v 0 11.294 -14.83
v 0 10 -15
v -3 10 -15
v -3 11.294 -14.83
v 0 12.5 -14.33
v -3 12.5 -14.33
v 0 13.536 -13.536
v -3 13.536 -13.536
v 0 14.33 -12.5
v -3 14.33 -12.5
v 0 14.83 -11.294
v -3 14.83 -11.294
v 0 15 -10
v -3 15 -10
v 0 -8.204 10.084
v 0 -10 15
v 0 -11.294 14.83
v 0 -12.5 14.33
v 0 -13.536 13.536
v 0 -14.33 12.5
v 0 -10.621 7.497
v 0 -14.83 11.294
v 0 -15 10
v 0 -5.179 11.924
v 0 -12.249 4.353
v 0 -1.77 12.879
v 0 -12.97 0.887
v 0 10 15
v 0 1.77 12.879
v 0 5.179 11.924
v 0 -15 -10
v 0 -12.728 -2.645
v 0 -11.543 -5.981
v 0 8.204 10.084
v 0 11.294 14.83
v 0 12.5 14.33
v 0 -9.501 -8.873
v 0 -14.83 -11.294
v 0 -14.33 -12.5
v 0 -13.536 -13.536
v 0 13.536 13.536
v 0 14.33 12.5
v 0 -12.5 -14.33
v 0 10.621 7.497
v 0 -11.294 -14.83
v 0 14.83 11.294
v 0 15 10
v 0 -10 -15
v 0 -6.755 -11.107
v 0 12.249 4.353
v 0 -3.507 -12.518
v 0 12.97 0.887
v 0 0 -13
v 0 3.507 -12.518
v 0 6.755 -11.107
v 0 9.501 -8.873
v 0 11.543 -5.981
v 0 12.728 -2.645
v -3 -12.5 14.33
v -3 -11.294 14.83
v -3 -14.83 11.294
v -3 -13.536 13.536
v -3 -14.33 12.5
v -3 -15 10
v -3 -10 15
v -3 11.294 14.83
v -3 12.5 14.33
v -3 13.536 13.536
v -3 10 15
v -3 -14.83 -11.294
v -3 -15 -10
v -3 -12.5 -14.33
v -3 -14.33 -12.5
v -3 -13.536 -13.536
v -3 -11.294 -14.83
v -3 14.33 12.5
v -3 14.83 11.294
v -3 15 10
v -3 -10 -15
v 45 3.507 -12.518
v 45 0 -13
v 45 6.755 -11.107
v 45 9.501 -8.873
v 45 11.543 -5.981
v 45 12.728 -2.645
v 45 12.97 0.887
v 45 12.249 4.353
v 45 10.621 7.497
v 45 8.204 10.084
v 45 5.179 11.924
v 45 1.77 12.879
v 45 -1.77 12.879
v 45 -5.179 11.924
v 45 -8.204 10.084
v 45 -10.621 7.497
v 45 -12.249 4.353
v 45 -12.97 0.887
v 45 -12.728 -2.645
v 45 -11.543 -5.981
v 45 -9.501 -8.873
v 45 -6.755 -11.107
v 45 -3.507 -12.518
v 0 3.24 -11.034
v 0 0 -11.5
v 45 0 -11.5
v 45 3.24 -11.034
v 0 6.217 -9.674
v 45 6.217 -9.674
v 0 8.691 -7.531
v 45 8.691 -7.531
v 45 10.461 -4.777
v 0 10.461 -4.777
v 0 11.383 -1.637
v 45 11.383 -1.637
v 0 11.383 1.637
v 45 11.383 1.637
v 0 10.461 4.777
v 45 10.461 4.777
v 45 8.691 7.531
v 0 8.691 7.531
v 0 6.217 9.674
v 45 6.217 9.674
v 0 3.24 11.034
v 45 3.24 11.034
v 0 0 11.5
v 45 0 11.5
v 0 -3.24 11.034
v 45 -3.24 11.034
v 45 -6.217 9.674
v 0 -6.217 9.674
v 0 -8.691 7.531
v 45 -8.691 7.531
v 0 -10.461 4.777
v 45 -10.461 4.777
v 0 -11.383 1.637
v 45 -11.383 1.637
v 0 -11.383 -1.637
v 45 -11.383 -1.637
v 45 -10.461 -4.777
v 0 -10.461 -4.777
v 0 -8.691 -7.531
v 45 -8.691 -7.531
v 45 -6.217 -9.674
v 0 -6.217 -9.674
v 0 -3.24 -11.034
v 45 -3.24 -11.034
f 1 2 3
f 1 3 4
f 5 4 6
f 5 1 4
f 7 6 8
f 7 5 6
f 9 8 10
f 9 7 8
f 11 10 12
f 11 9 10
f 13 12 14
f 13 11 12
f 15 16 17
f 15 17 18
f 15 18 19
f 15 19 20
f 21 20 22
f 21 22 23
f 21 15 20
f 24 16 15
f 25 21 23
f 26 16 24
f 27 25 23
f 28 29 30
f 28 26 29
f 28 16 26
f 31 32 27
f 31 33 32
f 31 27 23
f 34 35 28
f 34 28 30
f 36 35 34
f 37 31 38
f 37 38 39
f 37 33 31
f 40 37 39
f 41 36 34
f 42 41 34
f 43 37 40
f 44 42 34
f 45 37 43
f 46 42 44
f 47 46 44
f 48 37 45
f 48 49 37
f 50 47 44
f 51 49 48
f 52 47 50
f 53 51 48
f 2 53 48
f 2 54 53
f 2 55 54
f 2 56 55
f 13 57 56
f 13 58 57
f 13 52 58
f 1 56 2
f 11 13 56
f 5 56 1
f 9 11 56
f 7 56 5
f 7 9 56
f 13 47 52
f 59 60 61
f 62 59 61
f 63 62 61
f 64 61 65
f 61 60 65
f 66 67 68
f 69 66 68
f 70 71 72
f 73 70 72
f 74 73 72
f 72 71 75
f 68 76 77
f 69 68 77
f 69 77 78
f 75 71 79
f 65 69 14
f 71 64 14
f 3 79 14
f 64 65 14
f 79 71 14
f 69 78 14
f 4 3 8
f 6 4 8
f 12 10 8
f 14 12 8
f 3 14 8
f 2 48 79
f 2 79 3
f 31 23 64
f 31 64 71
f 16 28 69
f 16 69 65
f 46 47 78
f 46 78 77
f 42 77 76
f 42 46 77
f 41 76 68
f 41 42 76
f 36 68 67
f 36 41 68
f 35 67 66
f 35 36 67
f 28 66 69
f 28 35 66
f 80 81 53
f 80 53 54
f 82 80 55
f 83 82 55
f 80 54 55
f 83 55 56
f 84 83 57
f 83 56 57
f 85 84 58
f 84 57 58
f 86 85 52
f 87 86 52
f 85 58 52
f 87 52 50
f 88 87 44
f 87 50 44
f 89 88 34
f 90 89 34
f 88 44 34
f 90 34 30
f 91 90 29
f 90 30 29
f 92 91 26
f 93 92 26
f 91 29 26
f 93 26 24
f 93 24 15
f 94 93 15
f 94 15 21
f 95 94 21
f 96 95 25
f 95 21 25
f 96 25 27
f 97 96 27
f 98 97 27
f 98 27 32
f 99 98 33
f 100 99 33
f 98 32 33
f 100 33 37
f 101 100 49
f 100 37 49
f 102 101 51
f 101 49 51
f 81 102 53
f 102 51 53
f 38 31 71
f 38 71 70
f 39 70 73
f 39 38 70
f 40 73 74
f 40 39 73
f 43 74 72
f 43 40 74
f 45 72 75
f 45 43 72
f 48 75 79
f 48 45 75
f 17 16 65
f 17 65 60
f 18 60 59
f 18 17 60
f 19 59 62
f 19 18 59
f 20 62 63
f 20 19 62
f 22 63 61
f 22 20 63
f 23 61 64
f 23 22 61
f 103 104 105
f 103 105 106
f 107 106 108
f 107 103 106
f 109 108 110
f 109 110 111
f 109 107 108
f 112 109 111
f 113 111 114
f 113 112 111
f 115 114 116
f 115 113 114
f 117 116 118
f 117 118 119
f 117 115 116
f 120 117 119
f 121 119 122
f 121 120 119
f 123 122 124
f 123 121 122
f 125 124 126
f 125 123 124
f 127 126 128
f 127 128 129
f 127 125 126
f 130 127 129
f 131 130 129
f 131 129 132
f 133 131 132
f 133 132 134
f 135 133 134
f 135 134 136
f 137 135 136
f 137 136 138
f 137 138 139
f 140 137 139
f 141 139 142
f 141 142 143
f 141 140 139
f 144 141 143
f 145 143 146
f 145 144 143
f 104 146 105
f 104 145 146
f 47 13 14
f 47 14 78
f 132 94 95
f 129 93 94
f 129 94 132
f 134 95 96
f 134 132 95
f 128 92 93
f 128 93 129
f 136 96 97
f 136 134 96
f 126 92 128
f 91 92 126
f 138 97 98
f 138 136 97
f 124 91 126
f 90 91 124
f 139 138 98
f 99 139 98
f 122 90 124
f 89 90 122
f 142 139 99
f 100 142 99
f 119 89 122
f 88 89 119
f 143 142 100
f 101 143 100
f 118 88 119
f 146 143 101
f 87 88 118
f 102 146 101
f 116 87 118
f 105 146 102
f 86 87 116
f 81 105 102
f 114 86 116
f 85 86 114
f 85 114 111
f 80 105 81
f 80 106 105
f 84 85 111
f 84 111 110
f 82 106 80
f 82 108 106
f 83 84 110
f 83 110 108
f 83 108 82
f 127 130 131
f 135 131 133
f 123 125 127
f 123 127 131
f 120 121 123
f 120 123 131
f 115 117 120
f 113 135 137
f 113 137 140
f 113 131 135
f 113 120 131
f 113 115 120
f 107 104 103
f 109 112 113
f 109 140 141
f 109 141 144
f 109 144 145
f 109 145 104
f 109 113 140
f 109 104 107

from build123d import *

# Parameters (mm, degrees)
SKETCH1_R           = 13
SKETCH1_R_2         = 11.5
BOSS_EXTRUDE5_DEPTH = 45
BOSS_EXTRUDE7_DEPTH = 3


with BuildPart() as part:
    # Sketch1 → Boss-Extrude5 (new body)
    with BuildSketch(Plane(origin=(0, 0, 0), x_dir=(0, 0, -1), z_dir=(1, 0, 0))):
        Circle(SKETCH1_R)
        Circle(SKETCH1_R_2, mode=Mode.SUBTRACT)
    extrude(amount=BOSS_EXTRUDE5_DEPTH)

    # Sketch5 → Boss-Extrude7 (add)
    with BuildSketch(Plane.ZY):
        with BuildLine():
            Line((-10, 15), (10, 15))
            ThreePointArc((10, 15), (13.535533906, 13.535533906), (15, 10))
            Line((15, 10), (15, -10))
            ThreePointArc((15, -10), (13.535533906, -13.535533906), (10, -15))
            Line((10, -15), (-10, -15))
            ThreePointArc((-10, -15), (-13.535533906, -13.535533906), (-15, -10))
            Line((-15, -10), (-15, 10))
            ThreePointArc((-15, 10), (-13.535533906, 13.535533906), (-10, 15))
        make_face()
    extrude(amount=BOSS_EXTRUDE7_DEPTH)


solid = part.part
